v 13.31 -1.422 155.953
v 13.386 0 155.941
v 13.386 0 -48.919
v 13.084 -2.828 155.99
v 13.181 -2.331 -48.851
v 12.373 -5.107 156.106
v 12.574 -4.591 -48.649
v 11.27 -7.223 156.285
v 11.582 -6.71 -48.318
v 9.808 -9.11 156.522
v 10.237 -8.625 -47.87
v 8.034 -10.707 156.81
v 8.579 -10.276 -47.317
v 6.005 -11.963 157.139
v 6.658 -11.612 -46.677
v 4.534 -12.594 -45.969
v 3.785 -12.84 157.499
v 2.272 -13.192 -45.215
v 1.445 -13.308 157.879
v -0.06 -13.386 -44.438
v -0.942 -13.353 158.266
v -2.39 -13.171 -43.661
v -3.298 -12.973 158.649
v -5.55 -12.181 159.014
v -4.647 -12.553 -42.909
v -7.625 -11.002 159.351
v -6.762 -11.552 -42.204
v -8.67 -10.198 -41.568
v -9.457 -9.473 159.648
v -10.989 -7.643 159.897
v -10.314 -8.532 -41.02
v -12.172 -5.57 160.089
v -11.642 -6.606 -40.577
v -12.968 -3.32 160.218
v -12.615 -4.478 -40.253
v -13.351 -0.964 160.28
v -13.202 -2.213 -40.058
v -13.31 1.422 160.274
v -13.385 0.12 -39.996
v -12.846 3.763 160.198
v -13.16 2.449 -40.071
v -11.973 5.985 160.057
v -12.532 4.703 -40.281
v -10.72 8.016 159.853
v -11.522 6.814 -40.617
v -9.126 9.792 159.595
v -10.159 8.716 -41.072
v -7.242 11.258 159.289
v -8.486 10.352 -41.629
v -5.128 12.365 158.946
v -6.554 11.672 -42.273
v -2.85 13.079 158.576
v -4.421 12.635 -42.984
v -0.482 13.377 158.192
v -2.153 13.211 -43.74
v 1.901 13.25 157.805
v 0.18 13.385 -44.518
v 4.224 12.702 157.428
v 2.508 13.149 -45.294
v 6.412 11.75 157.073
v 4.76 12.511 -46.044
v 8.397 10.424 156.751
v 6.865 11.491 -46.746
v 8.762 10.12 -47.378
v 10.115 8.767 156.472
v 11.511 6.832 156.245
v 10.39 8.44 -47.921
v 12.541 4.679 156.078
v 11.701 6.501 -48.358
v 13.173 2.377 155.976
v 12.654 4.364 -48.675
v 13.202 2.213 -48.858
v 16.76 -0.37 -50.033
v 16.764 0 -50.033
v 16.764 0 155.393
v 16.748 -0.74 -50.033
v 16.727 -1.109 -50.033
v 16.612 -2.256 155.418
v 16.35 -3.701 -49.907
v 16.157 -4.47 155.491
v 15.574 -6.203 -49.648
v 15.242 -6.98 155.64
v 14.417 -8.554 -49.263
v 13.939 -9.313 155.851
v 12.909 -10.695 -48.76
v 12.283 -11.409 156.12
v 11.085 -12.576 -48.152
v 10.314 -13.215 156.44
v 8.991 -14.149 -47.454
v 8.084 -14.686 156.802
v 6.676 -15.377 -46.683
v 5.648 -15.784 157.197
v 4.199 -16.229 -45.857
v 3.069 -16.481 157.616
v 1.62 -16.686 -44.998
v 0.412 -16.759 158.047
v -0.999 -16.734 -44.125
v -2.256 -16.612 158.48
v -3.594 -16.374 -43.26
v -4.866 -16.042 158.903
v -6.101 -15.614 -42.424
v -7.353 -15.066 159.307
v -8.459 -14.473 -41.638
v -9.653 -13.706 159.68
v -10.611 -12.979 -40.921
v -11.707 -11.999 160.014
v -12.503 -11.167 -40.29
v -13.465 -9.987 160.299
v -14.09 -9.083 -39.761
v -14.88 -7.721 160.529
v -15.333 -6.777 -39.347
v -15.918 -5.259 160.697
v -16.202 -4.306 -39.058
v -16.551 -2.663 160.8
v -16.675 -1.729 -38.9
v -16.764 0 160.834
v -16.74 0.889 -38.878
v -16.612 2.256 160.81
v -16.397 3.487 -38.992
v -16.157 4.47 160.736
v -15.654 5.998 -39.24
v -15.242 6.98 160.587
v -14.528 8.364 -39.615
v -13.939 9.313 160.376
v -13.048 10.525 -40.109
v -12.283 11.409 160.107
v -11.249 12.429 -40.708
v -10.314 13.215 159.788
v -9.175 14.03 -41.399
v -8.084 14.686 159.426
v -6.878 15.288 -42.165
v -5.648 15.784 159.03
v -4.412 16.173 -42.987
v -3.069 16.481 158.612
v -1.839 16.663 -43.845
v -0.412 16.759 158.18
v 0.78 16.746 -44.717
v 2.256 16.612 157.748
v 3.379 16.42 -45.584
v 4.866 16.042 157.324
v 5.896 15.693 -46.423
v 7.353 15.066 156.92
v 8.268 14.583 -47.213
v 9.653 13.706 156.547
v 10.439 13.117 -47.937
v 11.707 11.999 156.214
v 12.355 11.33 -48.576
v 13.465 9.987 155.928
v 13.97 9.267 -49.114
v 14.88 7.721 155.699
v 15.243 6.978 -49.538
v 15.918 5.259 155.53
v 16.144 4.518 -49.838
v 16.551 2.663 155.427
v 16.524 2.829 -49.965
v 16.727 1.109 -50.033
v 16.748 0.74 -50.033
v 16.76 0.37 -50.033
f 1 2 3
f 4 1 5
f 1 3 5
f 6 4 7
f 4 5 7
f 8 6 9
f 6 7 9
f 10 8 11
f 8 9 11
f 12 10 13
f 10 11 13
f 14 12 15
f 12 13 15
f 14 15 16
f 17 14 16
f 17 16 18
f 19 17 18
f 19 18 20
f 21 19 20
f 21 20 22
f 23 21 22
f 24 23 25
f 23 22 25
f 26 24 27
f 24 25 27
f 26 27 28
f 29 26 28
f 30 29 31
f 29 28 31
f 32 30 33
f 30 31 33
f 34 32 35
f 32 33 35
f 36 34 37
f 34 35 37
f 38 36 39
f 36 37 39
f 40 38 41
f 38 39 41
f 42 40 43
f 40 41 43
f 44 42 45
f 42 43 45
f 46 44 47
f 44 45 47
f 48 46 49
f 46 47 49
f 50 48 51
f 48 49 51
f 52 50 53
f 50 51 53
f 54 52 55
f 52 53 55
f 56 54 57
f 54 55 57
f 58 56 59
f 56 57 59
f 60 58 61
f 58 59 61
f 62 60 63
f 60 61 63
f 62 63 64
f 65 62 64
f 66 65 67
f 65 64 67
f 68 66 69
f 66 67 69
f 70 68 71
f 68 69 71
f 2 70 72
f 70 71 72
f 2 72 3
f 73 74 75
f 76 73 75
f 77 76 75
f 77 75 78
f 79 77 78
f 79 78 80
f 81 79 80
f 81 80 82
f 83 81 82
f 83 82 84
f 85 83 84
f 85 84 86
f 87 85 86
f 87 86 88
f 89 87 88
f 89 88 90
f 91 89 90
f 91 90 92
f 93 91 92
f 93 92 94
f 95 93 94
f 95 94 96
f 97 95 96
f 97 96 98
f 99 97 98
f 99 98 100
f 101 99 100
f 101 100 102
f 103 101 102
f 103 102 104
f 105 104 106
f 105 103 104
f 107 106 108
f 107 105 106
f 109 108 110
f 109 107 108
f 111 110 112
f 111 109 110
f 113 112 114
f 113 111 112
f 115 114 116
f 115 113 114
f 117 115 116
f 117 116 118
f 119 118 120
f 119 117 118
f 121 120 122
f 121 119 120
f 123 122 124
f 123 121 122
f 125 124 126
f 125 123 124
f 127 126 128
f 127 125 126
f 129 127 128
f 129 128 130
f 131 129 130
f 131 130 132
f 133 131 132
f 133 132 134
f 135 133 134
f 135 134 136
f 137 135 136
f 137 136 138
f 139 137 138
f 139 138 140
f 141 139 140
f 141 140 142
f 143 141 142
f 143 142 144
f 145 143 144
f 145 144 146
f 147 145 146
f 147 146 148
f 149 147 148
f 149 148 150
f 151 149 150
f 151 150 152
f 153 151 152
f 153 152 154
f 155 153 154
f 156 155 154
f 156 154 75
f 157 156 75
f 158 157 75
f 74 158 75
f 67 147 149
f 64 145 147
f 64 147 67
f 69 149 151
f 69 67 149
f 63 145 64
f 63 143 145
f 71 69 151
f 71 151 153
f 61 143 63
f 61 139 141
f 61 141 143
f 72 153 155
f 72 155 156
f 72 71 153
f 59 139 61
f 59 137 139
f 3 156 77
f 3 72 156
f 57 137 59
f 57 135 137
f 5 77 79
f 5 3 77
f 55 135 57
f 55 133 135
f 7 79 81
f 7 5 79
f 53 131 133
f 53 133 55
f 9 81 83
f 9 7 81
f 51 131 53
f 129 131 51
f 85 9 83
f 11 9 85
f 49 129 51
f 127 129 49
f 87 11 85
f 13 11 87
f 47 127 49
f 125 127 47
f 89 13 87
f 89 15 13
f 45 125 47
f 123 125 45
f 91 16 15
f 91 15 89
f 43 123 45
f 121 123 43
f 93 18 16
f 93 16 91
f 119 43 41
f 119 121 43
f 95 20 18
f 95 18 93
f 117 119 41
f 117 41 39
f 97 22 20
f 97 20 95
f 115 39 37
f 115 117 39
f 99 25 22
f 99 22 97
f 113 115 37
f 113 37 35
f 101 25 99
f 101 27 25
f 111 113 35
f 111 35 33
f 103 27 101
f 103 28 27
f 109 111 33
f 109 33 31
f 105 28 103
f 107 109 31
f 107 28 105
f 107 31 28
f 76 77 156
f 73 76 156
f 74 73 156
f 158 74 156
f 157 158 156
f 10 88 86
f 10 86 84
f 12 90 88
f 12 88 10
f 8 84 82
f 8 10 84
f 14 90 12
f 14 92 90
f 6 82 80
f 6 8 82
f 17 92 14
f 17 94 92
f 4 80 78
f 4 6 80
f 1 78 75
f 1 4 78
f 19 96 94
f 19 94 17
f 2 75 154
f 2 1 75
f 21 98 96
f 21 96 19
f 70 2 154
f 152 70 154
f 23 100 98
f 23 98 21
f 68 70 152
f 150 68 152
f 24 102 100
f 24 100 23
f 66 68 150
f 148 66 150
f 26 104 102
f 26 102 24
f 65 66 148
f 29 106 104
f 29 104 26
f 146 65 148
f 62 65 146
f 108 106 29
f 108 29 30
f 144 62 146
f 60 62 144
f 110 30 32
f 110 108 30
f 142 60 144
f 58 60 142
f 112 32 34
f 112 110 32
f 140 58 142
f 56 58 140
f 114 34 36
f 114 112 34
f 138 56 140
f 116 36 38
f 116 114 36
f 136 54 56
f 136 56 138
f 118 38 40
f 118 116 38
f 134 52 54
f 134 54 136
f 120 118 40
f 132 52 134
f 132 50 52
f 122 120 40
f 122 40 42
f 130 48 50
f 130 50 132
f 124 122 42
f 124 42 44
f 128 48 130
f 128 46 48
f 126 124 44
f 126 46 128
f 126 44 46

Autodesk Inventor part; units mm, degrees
ref_plane "Start plane" through (0, 0, -50.0328) normal (0, 0, 1) x (1, 0, 0)
ref_plane "End plane" through (0, 0, 160.8343) normal (0, 0, 1) x (1, 0, 0)
sketch "Sketch" plane through (0, 0, 0) normal (0, 0, 1) x (1, 0, 0)
  circle A0 centre (0, 0) radius 13.3858
  circle A1 centre (0, 0) radius 16.764
  dimension "d0" = 33.528
  dimension "d1" = 3.3782
extrude "Body" add sketch "Sketch" along normal up to surface (210.8671 mm away) from surface at -50.0328
sketch "Sketch3" plane through (0, 0, 0) normal (0, 0, 1) x (1, 0, 0)
  line L0 (0, 0) -> (10, 0)
ref_plane "Work Plane3" through (0, 0, 0) normal (0, -1, 0) x (1, 0, 0)
ref_plane "Work Plane4" through (366.1399, 0, -166.4914) normal (-0.3162, 0, -0.9487) x (-0.9487, 0, 0.3162)
split "Split1" plane through (366.1399, 0, -166.4914) removes the side toward (-0.3162, 0, -0.9487)
ref_plane "Work Plane5" through (-16.764, 0, 160.8343) normal (0.1602, 0, 0.9871) x (0.9871, 0, -0.1602)
split "Split2" plane through (-16.764, 0, 160.8343) removes the side toward (0.1602, 0, 0.9871)
sketch "Sketch4" plane through (0, 0, 0) normal (0, -1, 0) x (1, 0, 0)
  line L0 (-2, -50.0328) -> (12, -50.0328) projected
  line L1 (-2, 160.8343) -> (12, 160.8343) projected
  dimension "d7" = 210.8671
equation "\"d0\" = G_H"
equation "\"d1\" = G_T"
equation "\"d2\" = G_L"
equation "\"G_H\" = 33.528"
equation "\"G_T\" = 3.3782"
equation "\"G_L\" = d7"
equation "\"G_OFFSET_START\" = 50.03276"
equation "\"G_OFFSET_END\" = 2.72042"
equation "\"d4\" = -G_OFFSET_START"
equation "\"d5\" = G_OFFSET_END + B_L"
equation "\"B_L\" = 158.11388"
properties part number "ANSI - 1 x 0.133 - 8.302" material "Steel, Mild"
